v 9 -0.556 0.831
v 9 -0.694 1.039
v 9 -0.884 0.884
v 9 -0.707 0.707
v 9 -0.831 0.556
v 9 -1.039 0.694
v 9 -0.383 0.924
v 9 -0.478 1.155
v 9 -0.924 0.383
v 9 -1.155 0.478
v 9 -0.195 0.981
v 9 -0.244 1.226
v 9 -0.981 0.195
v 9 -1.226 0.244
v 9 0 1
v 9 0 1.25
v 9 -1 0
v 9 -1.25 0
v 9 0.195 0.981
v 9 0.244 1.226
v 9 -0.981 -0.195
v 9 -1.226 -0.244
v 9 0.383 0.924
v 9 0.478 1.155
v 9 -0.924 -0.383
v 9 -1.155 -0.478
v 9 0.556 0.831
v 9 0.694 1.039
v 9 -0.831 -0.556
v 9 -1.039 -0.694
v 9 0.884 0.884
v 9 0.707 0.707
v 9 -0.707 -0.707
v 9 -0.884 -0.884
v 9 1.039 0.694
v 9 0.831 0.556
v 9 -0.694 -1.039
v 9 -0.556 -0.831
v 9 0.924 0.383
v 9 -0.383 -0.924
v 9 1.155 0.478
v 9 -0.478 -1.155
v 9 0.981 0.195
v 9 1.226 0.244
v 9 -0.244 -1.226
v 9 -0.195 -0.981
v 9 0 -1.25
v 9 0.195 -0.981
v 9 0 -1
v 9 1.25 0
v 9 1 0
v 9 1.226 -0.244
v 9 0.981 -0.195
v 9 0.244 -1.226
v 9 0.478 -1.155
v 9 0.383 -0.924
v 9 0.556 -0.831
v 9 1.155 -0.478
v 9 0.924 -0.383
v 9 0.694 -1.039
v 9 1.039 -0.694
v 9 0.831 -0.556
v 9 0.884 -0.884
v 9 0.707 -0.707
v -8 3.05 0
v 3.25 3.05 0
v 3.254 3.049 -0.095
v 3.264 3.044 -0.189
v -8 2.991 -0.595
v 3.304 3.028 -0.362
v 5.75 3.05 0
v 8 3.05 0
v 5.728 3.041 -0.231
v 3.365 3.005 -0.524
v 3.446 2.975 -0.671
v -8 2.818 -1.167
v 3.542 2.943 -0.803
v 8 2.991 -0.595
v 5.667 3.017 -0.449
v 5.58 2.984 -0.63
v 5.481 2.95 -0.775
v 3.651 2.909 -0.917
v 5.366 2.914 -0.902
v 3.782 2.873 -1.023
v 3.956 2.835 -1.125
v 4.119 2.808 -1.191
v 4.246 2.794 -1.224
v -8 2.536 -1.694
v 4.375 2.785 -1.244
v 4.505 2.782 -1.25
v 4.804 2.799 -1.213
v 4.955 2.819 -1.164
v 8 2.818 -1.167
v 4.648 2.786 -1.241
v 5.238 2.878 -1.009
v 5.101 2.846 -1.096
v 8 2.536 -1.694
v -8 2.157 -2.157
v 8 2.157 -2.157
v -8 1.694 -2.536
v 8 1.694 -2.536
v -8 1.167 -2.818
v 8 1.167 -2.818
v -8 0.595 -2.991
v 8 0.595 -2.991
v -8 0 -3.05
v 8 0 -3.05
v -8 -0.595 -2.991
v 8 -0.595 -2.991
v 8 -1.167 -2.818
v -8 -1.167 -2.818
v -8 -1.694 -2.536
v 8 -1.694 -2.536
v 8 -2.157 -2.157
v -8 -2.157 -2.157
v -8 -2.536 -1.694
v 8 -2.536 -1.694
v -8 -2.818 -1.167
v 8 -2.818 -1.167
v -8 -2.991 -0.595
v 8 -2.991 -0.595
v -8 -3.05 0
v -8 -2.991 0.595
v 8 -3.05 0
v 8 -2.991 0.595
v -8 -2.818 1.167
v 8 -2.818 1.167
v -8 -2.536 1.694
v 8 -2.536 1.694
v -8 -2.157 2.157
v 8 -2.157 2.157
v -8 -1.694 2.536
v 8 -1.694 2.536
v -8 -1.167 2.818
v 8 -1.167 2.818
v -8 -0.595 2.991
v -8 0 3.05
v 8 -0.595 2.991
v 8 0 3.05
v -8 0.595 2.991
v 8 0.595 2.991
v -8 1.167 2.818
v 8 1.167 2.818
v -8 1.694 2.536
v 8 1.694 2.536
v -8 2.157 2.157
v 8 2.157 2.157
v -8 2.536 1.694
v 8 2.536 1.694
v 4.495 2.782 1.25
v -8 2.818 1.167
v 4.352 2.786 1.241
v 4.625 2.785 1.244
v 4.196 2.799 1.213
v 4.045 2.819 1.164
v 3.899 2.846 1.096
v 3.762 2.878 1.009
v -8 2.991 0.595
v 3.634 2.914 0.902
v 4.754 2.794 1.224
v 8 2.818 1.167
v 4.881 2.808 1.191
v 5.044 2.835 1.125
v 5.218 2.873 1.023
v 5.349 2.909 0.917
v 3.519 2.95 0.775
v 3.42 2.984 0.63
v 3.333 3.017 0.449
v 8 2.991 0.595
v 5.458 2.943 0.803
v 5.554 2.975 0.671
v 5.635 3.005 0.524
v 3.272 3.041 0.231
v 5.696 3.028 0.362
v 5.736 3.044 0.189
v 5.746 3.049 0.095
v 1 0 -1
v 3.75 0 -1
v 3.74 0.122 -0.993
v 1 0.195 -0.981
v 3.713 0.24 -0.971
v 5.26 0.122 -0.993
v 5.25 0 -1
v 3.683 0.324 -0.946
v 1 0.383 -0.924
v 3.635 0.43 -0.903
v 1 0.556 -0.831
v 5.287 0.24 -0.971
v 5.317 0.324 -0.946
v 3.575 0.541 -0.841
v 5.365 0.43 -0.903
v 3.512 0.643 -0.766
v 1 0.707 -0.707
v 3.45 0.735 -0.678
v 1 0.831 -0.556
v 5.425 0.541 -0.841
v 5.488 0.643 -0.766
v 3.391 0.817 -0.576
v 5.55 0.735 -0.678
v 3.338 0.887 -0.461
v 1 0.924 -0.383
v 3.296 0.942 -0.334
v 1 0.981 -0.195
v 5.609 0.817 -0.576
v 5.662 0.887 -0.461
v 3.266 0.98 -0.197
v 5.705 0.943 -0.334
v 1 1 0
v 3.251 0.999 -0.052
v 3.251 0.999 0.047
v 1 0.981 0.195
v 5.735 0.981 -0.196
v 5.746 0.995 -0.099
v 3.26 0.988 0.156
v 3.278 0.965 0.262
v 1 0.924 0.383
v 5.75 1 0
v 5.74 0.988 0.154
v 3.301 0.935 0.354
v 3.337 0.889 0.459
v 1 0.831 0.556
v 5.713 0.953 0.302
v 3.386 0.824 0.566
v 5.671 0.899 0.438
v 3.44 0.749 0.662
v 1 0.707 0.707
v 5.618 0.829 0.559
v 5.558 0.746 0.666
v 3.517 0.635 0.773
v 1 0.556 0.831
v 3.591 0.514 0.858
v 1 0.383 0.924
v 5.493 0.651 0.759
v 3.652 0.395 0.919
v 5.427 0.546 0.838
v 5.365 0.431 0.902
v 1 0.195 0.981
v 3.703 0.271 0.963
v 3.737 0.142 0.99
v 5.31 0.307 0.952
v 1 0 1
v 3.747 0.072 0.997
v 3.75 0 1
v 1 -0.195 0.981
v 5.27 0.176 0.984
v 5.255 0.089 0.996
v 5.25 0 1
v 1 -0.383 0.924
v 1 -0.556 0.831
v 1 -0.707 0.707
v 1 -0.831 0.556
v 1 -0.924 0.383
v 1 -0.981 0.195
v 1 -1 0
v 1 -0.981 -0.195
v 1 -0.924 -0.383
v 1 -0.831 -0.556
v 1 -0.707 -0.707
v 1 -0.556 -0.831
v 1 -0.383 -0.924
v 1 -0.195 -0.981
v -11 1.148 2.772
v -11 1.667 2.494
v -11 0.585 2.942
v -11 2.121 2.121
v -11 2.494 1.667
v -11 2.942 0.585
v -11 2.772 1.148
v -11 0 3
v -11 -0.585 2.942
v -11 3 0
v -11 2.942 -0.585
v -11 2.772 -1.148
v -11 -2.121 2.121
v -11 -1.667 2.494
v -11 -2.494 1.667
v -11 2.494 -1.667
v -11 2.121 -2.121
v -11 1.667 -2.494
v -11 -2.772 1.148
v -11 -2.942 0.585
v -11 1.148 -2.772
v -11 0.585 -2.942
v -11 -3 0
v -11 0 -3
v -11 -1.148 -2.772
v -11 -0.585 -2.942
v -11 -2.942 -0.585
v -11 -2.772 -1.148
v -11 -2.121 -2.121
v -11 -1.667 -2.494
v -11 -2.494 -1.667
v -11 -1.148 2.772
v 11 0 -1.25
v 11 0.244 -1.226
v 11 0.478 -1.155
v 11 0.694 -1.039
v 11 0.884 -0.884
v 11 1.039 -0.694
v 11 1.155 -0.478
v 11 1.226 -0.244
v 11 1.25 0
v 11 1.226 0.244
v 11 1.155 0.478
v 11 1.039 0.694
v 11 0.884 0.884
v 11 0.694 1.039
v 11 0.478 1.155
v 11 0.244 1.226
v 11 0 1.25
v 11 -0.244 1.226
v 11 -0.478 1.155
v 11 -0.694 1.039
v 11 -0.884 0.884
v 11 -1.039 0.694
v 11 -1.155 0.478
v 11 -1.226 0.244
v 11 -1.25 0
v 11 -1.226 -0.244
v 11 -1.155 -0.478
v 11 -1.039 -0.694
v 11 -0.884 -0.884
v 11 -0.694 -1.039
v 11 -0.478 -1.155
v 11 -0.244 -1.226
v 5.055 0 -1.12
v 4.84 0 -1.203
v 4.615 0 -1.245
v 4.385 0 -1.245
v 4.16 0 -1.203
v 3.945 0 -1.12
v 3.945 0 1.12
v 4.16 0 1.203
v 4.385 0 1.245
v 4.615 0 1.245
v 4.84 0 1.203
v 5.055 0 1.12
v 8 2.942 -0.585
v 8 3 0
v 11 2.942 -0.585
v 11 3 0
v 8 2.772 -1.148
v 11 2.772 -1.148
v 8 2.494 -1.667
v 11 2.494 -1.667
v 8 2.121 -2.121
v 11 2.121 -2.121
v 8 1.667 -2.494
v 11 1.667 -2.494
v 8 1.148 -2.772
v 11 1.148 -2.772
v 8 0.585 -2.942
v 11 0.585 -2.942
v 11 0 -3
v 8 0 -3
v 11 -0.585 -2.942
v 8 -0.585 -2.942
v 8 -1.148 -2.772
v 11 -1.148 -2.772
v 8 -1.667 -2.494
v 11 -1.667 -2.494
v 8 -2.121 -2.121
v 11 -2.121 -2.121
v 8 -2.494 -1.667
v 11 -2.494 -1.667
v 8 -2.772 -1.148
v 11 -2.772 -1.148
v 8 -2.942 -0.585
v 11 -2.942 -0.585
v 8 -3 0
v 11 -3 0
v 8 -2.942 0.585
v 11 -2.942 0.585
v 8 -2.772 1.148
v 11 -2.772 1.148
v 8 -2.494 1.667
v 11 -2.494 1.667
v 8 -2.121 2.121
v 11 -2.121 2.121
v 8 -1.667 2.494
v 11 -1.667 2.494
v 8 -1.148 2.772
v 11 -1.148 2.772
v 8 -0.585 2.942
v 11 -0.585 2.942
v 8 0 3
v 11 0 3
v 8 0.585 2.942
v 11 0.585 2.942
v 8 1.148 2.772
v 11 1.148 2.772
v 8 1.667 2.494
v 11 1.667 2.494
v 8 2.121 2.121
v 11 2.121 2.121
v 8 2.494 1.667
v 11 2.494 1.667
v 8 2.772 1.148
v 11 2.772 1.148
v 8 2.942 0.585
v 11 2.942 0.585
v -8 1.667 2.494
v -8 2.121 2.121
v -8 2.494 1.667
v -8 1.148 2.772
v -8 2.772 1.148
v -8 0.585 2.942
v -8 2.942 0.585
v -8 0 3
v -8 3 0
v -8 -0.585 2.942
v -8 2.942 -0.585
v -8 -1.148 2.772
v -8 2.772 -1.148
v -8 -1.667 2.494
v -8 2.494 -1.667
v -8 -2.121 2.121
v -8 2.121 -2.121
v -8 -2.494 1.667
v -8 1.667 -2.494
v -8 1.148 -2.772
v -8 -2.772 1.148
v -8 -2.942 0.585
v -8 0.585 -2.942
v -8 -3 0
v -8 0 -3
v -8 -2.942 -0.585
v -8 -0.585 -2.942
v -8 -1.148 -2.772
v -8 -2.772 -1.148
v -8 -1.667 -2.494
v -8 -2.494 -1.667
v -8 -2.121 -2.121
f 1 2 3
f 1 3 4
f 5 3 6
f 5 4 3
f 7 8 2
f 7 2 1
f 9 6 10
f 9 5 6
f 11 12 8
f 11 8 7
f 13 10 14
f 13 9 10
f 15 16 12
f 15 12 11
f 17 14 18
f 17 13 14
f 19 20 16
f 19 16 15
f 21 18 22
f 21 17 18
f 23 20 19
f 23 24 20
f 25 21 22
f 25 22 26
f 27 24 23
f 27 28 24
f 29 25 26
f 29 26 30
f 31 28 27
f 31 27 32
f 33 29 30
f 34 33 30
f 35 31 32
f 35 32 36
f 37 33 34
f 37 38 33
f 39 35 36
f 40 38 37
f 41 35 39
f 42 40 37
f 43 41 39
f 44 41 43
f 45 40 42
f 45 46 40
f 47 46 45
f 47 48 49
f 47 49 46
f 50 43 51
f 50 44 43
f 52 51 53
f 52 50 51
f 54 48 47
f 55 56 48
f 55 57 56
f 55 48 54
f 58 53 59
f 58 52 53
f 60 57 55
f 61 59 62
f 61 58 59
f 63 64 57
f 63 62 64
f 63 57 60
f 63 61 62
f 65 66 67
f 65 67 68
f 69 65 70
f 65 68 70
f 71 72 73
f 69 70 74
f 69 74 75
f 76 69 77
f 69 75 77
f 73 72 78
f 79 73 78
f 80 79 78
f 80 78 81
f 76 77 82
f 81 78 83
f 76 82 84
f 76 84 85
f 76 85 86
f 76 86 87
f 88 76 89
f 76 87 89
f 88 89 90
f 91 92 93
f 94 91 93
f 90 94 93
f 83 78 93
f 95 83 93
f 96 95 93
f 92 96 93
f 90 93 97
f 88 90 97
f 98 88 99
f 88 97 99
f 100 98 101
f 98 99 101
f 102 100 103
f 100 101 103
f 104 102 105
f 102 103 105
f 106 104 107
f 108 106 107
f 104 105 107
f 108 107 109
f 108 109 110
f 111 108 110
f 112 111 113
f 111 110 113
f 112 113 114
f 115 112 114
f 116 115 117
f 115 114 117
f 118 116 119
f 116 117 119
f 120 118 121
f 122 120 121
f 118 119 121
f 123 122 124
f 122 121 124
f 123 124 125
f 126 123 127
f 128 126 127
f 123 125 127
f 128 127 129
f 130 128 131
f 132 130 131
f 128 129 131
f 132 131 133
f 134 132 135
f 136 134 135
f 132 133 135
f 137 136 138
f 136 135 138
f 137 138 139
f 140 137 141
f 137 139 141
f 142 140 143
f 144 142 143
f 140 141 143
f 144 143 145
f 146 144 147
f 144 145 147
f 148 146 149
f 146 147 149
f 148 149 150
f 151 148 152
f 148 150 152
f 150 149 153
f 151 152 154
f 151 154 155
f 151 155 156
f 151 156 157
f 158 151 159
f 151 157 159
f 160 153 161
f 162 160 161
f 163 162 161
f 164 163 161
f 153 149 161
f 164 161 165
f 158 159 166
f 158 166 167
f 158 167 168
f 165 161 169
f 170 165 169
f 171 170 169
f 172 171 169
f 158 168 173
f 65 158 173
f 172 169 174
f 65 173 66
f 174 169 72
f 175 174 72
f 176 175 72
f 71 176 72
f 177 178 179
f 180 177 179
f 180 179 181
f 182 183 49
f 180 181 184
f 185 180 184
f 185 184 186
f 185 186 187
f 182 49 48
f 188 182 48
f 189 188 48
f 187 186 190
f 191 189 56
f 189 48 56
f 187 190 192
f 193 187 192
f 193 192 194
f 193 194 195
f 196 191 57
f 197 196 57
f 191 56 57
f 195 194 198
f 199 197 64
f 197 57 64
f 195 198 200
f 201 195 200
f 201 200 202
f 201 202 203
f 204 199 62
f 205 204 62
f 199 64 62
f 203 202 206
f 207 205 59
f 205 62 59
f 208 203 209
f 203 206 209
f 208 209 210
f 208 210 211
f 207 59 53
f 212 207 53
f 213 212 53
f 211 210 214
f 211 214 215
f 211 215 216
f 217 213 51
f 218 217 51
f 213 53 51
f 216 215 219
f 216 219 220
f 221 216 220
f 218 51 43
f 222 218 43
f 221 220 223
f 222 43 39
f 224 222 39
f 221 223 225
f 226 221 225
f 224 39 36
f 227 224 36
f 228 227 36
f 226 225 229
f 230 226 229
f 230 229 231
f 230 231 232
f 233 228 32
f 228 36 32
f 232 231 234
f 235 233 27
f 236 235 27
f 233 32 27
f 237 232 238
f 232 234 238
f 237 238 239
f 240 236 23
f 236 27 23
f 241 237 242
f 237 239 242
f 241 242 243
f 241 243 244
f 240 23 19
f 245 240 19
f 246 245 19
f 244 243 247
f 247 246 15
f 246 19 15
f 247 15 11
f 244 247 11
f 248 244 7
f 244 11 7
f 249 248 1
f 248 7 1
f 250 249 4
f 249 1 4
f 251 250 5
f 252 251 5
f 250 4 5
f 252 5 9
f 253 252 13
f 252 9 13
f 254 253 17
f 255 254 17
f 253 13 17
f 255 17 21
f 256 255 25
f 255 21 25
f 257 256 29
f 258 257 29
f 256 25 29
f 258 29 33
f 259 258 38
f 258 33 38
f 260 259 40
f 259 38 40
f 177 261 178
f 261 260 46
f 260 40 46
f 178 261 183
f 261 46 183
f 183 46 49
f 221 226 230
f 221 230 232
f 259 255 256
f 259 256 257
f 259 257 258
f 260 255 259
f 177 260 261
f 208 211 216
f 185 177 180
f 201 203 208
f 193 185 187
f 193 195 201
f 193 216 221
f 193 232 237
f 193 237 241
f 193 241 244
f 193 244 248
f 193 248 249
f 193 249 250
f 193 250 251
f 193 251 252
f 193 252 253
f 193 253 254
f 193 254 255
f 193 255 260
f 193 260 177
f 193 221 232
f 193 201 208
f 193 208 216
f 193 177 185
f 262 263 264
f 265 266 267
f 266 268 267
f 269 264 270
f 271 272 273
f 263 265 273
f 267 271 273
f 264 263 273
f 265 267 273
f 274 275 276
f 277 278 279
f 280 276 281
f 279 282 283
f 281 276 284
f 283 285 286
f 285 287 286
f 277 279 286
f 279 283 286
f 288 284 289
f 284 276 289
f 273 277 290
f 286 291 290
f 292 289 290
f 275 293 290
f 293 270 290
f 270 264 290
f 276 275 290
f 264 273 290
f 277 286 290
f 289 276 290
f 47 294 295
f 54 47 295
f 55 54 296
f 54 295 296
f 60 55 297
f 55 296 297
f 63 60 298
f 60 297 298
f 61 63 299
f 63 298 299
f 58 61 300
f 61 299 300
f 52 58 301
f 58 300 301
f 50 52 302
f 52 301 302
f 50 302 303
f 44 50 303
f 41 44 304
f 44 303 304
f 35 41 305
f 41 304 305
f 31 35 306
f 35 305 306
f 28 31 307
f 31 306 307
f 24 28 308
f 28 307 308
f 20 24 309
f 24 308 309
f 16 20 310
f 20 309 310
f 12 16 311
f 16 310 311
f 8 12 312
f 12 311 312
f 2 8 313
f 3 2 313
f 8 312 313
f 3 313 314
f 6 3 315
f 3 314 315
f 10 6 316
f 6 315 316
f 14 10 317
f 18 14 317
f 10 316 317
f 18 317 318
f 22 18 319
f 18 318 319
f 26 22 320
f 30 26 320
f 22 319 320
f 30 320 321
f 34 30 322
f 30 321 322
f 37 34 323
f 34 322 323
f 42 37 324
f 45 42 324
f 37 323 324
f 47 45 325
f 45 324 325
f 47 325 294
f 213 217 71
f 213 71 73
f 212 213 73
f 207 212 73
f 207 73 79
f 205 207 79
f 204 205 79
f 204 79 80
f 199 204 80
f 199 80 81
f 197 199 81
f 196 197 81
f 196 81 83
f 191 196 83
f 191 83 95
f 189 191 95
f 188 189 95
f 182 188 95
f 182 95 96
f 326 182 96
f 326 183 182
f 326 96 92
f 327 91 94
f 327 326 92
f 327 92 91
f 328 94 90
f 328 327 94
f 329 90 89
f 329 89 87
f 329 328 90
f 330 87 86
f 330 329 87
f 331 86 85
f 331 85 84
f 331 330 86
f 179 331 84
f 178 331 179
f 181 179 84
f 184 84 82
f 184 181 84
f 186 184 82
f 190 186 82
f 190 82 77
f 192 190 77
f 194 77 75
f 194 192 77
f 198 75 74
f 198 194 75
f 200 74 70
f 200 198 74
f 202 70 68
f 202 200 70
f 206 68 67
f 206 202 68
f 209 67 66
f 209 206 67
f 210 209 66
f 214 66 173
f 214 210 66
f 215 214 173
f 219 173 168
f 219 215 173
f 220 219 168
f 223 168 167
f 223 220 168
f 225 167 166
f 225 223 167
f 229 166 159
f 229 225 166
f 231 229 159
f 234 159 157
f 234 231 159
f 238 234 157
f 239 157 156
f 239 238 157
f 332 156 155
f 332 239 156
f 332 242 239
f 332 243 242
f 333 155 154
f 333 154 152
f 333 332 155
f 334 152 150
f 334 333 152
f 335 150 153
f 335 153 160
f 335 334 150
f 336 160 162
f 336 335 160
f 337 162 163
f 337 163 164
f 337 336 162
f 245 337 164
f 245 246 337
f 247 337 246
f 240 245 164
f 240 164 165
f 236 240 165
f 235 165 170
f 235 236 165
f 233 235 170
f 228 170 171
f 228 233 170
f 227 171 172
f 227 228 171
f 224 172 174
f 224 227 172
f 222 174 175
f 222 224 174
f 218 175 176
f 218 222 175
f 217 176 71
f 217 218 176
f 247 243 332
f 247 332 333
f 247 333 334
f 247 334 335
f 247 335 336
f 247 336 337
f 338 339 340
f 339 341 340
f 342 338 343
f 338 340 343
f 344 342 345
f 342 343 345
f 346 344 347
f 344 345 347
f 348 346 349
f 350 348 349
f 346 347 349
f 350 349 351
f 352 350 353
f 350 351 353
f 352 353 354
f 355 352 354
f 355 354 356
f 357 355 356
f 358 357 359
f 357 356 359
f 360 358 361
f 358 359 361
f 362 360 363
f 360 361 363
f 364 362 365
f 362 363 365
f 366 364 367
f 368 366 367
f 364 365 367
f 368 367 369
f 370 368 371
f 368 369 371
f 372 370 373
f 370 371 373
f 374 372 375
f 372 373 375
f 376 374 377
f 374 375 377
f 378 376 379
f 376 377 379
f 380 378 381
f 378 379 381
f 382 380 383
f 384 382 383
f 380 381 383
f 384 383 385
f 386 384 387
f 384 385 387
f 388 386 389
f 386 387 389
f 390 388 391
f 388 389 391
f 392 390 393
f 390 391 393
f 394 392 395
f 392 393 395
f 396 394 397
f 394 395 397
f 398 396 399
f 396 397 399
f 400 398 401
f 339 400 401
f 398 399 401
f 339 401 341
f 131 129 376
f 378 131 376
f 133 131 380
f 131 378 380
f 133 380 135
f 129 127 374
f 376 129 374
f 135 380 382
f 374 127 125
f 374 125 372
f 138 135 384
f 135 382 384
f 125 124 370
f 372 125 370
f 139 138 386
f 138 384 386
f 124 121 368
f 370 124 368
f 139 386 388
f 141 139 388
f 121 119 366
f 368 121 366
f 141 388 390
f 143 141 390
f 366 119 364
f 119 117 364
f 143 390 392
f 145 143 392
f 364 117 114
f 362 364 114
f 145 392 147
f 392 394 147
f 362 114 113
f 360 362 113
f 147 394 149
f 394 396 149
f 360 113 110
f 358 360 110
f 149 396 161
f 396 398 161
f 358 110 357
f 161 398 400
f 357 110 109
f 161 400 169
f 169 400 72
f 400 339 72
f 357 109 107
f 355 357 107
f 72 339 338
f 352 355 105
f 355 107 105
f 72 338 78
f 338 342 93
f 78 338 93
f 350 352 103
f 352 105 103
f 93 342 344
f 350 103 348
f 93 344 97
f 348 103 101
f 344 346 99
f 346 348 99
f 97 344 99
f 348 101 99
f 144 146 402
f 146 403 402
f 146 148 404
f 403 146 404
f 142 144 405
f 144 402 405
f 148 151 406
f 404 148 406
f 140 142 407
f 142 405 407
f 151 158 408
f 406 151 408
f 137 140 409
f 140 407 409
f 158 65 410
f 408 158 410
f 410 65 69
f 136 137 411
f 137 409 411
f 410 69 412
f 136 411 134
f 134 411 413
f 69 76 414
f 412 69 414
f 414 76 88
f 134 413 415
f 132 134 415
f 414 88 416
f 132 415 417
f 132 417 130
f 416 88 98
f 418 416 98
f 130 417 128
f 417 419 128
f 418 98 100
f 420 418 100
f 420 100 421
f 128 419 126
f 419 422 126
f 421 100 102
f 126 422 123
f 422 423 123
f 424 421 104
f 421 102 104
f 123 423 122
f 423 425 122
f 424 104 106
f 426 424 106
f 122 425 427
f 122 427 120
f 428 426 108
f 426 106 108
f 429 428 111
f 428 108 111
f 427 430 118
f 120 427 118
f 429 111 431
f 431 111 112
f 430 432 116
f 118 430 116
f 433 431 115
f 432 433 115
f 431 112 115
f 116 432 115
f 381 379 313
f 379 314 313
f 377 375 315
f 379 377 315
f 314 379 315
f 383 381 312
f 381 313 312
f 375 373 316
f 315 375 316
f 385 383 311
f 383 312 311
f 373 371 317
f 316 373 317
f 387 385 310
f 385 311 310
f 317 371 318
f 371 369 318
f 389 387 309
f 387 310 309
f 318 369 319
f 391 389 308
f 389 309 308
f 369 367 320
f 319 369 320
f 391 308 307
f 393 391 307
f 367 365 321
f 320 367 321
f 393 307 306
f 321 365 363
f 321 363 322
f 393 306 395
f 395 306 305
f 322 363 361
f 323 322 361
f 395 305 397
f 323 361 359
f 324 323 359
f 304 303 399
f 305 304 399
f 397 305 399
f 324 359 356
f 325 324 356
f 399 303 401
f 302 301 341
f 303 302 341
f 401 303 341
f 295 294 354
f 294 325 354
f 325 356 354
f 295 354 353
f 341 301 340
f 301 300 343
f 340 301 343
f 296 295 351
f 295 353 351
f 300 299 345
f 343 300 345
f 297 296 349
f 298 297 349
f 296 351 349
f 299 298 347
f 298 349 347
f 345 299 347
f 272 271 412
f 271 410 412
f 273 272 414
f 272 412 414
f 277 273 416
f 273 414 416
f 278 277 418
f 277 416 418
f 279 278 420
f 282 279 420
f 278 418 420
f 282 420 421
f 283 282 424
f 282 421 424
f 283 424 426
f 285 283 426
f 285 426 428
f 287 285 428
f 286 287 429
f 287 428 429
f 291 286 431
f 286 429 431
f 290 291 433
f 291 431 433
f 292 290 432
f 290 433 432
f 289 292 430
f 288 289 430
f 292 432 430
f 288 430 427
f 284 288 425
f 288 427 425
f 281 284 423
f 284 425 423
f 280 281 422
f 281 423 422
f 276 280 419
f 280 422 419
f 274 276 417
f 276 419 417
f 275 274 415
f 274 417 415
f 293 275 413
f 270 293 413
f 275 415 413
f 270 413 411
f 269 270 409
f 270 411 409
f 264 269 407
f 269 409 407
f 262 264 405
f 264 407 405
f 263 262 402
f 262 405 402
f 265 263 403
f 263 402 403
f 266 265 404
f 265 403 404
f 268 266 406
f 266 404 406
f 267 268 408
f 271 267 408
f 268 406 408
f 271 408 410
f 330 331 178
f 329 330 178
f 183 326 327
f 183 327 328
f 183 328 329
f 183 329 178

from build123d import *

# Parameters (mm, degrees)
SKIZZE2_R                       = 1
SCHNITT_LINEAR_AUSTRAGEN1_DEPTH = 10
SKIZZE2_3_R                     = 1.25
SKIZZE2_3_R_2                   = 1
SCHNITT_LINEAR_AUSTRAGEN2_DEPTH = 2
SKIZZE3_R                       = 1.25
SCHNITT_LINEAR_AUSTRAGEN3_DEPTH = 4.05


with BuildPart() as part:
    # Skizze1 → Rotation1 (revolve)
    with BuildSketch(Plane.XY):
        Polygon((-11, 3), (-8, 3), (-8, 3.05), (8, 3.05), (8, 3), (11, 3), (11, 0), (-11, 0), align=None)
    revolve(axis=Axis((-97.111770595, 0, 0), (-1, 0, 0)))

    # Skizze2 → Schnitt-Linear austragen1 (cut)
    with BuildSketch(Plane(origin=(11, 0, 0), x_dir=(0, 0, -1), z_dir=(1, 0, 0))):
        Circle(SKIZZE2_R)
    extrude(amount=-SCHNITT_LINEAR_AUSTRAGEN1_DEPTH, mode=Mode.SUBTRACT)

    # Skizze2<3> → Schnitt-Linear austragen2 (cut)
    with BuildSketch(Plane(origin=(11, 0, 0), x_dir=(0, 0, -1), z_dir=(1, 0, 0))):
        Circle(SKIZZE2_3_R)
        Circle(SKIZZE2_3_R_2, mode=Mode.SUBTRACT)
    extrude(amount=-SCHNITT_LINEAR_AUSTRAGEN2_DEPTH, mode=Mode.SUBTRACT)

    # Skizze3 → Schnitt-Linear austragen3 (cut, through all)
    with BuildSketch(Plane(origin=(0, 0, 0), x_dir=(1, 0, 0), z_dir=(0, 1, 0))):
        with Locations((4.5, 0)):
            Circle(SKIZZE3_R)
    extrude(amount=SCHNITT_LINEAR_AUSTRAGEN3_DEPTH, mode=Mode.SUBTRACT)


solid = part.part
